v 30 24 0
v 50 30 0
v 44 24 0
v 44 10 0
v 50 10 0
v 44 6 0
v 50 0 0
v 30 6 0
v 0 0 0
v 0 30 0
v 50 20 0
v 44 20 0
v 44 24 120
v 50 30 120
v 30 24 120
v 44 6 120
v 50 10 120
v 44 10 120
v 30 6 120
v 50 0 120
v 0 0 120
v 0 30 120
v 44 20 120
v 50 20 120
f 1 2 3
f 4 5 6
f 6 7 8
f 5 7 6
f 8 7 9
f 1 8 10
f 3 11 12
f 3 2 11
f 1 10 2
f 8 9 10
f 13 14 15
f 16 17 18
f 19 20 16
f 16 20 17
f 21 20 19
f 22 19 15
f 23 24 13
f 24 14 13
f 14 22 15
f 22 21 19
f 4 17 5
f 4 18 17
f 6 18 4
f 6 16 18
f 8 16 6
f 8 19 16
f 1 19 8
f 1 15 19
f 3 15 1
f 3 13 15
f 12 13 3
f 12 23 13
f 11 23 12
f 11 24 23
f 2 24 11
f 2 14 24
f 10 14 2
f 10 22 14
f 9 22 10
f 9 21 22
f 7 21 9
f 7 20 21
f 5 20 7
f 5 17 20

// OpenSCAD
$fn = 32;

// ----------------------------------------------------------------------
// T-slot rail: 50 x 30 mm section, 120 mm long
// ----------------------------------------------------------------------

// --- parameters (mm) ---
profile_height = 120;     // extrusion height
profile_points = 12;      // points of the closed outline

profile = [[0, 0], [50, 0], [50, 10], [44, 10], [44, 6], [30, 6], [30, 24], [44, 24], [44, 20], [50, 20], [50, 30], [0, 30]];  // single closed polygon, 12 points, counter clockwise

// --- the one profile operation ---
linear_extrude(height = profile_height) polygon(points = profile);
